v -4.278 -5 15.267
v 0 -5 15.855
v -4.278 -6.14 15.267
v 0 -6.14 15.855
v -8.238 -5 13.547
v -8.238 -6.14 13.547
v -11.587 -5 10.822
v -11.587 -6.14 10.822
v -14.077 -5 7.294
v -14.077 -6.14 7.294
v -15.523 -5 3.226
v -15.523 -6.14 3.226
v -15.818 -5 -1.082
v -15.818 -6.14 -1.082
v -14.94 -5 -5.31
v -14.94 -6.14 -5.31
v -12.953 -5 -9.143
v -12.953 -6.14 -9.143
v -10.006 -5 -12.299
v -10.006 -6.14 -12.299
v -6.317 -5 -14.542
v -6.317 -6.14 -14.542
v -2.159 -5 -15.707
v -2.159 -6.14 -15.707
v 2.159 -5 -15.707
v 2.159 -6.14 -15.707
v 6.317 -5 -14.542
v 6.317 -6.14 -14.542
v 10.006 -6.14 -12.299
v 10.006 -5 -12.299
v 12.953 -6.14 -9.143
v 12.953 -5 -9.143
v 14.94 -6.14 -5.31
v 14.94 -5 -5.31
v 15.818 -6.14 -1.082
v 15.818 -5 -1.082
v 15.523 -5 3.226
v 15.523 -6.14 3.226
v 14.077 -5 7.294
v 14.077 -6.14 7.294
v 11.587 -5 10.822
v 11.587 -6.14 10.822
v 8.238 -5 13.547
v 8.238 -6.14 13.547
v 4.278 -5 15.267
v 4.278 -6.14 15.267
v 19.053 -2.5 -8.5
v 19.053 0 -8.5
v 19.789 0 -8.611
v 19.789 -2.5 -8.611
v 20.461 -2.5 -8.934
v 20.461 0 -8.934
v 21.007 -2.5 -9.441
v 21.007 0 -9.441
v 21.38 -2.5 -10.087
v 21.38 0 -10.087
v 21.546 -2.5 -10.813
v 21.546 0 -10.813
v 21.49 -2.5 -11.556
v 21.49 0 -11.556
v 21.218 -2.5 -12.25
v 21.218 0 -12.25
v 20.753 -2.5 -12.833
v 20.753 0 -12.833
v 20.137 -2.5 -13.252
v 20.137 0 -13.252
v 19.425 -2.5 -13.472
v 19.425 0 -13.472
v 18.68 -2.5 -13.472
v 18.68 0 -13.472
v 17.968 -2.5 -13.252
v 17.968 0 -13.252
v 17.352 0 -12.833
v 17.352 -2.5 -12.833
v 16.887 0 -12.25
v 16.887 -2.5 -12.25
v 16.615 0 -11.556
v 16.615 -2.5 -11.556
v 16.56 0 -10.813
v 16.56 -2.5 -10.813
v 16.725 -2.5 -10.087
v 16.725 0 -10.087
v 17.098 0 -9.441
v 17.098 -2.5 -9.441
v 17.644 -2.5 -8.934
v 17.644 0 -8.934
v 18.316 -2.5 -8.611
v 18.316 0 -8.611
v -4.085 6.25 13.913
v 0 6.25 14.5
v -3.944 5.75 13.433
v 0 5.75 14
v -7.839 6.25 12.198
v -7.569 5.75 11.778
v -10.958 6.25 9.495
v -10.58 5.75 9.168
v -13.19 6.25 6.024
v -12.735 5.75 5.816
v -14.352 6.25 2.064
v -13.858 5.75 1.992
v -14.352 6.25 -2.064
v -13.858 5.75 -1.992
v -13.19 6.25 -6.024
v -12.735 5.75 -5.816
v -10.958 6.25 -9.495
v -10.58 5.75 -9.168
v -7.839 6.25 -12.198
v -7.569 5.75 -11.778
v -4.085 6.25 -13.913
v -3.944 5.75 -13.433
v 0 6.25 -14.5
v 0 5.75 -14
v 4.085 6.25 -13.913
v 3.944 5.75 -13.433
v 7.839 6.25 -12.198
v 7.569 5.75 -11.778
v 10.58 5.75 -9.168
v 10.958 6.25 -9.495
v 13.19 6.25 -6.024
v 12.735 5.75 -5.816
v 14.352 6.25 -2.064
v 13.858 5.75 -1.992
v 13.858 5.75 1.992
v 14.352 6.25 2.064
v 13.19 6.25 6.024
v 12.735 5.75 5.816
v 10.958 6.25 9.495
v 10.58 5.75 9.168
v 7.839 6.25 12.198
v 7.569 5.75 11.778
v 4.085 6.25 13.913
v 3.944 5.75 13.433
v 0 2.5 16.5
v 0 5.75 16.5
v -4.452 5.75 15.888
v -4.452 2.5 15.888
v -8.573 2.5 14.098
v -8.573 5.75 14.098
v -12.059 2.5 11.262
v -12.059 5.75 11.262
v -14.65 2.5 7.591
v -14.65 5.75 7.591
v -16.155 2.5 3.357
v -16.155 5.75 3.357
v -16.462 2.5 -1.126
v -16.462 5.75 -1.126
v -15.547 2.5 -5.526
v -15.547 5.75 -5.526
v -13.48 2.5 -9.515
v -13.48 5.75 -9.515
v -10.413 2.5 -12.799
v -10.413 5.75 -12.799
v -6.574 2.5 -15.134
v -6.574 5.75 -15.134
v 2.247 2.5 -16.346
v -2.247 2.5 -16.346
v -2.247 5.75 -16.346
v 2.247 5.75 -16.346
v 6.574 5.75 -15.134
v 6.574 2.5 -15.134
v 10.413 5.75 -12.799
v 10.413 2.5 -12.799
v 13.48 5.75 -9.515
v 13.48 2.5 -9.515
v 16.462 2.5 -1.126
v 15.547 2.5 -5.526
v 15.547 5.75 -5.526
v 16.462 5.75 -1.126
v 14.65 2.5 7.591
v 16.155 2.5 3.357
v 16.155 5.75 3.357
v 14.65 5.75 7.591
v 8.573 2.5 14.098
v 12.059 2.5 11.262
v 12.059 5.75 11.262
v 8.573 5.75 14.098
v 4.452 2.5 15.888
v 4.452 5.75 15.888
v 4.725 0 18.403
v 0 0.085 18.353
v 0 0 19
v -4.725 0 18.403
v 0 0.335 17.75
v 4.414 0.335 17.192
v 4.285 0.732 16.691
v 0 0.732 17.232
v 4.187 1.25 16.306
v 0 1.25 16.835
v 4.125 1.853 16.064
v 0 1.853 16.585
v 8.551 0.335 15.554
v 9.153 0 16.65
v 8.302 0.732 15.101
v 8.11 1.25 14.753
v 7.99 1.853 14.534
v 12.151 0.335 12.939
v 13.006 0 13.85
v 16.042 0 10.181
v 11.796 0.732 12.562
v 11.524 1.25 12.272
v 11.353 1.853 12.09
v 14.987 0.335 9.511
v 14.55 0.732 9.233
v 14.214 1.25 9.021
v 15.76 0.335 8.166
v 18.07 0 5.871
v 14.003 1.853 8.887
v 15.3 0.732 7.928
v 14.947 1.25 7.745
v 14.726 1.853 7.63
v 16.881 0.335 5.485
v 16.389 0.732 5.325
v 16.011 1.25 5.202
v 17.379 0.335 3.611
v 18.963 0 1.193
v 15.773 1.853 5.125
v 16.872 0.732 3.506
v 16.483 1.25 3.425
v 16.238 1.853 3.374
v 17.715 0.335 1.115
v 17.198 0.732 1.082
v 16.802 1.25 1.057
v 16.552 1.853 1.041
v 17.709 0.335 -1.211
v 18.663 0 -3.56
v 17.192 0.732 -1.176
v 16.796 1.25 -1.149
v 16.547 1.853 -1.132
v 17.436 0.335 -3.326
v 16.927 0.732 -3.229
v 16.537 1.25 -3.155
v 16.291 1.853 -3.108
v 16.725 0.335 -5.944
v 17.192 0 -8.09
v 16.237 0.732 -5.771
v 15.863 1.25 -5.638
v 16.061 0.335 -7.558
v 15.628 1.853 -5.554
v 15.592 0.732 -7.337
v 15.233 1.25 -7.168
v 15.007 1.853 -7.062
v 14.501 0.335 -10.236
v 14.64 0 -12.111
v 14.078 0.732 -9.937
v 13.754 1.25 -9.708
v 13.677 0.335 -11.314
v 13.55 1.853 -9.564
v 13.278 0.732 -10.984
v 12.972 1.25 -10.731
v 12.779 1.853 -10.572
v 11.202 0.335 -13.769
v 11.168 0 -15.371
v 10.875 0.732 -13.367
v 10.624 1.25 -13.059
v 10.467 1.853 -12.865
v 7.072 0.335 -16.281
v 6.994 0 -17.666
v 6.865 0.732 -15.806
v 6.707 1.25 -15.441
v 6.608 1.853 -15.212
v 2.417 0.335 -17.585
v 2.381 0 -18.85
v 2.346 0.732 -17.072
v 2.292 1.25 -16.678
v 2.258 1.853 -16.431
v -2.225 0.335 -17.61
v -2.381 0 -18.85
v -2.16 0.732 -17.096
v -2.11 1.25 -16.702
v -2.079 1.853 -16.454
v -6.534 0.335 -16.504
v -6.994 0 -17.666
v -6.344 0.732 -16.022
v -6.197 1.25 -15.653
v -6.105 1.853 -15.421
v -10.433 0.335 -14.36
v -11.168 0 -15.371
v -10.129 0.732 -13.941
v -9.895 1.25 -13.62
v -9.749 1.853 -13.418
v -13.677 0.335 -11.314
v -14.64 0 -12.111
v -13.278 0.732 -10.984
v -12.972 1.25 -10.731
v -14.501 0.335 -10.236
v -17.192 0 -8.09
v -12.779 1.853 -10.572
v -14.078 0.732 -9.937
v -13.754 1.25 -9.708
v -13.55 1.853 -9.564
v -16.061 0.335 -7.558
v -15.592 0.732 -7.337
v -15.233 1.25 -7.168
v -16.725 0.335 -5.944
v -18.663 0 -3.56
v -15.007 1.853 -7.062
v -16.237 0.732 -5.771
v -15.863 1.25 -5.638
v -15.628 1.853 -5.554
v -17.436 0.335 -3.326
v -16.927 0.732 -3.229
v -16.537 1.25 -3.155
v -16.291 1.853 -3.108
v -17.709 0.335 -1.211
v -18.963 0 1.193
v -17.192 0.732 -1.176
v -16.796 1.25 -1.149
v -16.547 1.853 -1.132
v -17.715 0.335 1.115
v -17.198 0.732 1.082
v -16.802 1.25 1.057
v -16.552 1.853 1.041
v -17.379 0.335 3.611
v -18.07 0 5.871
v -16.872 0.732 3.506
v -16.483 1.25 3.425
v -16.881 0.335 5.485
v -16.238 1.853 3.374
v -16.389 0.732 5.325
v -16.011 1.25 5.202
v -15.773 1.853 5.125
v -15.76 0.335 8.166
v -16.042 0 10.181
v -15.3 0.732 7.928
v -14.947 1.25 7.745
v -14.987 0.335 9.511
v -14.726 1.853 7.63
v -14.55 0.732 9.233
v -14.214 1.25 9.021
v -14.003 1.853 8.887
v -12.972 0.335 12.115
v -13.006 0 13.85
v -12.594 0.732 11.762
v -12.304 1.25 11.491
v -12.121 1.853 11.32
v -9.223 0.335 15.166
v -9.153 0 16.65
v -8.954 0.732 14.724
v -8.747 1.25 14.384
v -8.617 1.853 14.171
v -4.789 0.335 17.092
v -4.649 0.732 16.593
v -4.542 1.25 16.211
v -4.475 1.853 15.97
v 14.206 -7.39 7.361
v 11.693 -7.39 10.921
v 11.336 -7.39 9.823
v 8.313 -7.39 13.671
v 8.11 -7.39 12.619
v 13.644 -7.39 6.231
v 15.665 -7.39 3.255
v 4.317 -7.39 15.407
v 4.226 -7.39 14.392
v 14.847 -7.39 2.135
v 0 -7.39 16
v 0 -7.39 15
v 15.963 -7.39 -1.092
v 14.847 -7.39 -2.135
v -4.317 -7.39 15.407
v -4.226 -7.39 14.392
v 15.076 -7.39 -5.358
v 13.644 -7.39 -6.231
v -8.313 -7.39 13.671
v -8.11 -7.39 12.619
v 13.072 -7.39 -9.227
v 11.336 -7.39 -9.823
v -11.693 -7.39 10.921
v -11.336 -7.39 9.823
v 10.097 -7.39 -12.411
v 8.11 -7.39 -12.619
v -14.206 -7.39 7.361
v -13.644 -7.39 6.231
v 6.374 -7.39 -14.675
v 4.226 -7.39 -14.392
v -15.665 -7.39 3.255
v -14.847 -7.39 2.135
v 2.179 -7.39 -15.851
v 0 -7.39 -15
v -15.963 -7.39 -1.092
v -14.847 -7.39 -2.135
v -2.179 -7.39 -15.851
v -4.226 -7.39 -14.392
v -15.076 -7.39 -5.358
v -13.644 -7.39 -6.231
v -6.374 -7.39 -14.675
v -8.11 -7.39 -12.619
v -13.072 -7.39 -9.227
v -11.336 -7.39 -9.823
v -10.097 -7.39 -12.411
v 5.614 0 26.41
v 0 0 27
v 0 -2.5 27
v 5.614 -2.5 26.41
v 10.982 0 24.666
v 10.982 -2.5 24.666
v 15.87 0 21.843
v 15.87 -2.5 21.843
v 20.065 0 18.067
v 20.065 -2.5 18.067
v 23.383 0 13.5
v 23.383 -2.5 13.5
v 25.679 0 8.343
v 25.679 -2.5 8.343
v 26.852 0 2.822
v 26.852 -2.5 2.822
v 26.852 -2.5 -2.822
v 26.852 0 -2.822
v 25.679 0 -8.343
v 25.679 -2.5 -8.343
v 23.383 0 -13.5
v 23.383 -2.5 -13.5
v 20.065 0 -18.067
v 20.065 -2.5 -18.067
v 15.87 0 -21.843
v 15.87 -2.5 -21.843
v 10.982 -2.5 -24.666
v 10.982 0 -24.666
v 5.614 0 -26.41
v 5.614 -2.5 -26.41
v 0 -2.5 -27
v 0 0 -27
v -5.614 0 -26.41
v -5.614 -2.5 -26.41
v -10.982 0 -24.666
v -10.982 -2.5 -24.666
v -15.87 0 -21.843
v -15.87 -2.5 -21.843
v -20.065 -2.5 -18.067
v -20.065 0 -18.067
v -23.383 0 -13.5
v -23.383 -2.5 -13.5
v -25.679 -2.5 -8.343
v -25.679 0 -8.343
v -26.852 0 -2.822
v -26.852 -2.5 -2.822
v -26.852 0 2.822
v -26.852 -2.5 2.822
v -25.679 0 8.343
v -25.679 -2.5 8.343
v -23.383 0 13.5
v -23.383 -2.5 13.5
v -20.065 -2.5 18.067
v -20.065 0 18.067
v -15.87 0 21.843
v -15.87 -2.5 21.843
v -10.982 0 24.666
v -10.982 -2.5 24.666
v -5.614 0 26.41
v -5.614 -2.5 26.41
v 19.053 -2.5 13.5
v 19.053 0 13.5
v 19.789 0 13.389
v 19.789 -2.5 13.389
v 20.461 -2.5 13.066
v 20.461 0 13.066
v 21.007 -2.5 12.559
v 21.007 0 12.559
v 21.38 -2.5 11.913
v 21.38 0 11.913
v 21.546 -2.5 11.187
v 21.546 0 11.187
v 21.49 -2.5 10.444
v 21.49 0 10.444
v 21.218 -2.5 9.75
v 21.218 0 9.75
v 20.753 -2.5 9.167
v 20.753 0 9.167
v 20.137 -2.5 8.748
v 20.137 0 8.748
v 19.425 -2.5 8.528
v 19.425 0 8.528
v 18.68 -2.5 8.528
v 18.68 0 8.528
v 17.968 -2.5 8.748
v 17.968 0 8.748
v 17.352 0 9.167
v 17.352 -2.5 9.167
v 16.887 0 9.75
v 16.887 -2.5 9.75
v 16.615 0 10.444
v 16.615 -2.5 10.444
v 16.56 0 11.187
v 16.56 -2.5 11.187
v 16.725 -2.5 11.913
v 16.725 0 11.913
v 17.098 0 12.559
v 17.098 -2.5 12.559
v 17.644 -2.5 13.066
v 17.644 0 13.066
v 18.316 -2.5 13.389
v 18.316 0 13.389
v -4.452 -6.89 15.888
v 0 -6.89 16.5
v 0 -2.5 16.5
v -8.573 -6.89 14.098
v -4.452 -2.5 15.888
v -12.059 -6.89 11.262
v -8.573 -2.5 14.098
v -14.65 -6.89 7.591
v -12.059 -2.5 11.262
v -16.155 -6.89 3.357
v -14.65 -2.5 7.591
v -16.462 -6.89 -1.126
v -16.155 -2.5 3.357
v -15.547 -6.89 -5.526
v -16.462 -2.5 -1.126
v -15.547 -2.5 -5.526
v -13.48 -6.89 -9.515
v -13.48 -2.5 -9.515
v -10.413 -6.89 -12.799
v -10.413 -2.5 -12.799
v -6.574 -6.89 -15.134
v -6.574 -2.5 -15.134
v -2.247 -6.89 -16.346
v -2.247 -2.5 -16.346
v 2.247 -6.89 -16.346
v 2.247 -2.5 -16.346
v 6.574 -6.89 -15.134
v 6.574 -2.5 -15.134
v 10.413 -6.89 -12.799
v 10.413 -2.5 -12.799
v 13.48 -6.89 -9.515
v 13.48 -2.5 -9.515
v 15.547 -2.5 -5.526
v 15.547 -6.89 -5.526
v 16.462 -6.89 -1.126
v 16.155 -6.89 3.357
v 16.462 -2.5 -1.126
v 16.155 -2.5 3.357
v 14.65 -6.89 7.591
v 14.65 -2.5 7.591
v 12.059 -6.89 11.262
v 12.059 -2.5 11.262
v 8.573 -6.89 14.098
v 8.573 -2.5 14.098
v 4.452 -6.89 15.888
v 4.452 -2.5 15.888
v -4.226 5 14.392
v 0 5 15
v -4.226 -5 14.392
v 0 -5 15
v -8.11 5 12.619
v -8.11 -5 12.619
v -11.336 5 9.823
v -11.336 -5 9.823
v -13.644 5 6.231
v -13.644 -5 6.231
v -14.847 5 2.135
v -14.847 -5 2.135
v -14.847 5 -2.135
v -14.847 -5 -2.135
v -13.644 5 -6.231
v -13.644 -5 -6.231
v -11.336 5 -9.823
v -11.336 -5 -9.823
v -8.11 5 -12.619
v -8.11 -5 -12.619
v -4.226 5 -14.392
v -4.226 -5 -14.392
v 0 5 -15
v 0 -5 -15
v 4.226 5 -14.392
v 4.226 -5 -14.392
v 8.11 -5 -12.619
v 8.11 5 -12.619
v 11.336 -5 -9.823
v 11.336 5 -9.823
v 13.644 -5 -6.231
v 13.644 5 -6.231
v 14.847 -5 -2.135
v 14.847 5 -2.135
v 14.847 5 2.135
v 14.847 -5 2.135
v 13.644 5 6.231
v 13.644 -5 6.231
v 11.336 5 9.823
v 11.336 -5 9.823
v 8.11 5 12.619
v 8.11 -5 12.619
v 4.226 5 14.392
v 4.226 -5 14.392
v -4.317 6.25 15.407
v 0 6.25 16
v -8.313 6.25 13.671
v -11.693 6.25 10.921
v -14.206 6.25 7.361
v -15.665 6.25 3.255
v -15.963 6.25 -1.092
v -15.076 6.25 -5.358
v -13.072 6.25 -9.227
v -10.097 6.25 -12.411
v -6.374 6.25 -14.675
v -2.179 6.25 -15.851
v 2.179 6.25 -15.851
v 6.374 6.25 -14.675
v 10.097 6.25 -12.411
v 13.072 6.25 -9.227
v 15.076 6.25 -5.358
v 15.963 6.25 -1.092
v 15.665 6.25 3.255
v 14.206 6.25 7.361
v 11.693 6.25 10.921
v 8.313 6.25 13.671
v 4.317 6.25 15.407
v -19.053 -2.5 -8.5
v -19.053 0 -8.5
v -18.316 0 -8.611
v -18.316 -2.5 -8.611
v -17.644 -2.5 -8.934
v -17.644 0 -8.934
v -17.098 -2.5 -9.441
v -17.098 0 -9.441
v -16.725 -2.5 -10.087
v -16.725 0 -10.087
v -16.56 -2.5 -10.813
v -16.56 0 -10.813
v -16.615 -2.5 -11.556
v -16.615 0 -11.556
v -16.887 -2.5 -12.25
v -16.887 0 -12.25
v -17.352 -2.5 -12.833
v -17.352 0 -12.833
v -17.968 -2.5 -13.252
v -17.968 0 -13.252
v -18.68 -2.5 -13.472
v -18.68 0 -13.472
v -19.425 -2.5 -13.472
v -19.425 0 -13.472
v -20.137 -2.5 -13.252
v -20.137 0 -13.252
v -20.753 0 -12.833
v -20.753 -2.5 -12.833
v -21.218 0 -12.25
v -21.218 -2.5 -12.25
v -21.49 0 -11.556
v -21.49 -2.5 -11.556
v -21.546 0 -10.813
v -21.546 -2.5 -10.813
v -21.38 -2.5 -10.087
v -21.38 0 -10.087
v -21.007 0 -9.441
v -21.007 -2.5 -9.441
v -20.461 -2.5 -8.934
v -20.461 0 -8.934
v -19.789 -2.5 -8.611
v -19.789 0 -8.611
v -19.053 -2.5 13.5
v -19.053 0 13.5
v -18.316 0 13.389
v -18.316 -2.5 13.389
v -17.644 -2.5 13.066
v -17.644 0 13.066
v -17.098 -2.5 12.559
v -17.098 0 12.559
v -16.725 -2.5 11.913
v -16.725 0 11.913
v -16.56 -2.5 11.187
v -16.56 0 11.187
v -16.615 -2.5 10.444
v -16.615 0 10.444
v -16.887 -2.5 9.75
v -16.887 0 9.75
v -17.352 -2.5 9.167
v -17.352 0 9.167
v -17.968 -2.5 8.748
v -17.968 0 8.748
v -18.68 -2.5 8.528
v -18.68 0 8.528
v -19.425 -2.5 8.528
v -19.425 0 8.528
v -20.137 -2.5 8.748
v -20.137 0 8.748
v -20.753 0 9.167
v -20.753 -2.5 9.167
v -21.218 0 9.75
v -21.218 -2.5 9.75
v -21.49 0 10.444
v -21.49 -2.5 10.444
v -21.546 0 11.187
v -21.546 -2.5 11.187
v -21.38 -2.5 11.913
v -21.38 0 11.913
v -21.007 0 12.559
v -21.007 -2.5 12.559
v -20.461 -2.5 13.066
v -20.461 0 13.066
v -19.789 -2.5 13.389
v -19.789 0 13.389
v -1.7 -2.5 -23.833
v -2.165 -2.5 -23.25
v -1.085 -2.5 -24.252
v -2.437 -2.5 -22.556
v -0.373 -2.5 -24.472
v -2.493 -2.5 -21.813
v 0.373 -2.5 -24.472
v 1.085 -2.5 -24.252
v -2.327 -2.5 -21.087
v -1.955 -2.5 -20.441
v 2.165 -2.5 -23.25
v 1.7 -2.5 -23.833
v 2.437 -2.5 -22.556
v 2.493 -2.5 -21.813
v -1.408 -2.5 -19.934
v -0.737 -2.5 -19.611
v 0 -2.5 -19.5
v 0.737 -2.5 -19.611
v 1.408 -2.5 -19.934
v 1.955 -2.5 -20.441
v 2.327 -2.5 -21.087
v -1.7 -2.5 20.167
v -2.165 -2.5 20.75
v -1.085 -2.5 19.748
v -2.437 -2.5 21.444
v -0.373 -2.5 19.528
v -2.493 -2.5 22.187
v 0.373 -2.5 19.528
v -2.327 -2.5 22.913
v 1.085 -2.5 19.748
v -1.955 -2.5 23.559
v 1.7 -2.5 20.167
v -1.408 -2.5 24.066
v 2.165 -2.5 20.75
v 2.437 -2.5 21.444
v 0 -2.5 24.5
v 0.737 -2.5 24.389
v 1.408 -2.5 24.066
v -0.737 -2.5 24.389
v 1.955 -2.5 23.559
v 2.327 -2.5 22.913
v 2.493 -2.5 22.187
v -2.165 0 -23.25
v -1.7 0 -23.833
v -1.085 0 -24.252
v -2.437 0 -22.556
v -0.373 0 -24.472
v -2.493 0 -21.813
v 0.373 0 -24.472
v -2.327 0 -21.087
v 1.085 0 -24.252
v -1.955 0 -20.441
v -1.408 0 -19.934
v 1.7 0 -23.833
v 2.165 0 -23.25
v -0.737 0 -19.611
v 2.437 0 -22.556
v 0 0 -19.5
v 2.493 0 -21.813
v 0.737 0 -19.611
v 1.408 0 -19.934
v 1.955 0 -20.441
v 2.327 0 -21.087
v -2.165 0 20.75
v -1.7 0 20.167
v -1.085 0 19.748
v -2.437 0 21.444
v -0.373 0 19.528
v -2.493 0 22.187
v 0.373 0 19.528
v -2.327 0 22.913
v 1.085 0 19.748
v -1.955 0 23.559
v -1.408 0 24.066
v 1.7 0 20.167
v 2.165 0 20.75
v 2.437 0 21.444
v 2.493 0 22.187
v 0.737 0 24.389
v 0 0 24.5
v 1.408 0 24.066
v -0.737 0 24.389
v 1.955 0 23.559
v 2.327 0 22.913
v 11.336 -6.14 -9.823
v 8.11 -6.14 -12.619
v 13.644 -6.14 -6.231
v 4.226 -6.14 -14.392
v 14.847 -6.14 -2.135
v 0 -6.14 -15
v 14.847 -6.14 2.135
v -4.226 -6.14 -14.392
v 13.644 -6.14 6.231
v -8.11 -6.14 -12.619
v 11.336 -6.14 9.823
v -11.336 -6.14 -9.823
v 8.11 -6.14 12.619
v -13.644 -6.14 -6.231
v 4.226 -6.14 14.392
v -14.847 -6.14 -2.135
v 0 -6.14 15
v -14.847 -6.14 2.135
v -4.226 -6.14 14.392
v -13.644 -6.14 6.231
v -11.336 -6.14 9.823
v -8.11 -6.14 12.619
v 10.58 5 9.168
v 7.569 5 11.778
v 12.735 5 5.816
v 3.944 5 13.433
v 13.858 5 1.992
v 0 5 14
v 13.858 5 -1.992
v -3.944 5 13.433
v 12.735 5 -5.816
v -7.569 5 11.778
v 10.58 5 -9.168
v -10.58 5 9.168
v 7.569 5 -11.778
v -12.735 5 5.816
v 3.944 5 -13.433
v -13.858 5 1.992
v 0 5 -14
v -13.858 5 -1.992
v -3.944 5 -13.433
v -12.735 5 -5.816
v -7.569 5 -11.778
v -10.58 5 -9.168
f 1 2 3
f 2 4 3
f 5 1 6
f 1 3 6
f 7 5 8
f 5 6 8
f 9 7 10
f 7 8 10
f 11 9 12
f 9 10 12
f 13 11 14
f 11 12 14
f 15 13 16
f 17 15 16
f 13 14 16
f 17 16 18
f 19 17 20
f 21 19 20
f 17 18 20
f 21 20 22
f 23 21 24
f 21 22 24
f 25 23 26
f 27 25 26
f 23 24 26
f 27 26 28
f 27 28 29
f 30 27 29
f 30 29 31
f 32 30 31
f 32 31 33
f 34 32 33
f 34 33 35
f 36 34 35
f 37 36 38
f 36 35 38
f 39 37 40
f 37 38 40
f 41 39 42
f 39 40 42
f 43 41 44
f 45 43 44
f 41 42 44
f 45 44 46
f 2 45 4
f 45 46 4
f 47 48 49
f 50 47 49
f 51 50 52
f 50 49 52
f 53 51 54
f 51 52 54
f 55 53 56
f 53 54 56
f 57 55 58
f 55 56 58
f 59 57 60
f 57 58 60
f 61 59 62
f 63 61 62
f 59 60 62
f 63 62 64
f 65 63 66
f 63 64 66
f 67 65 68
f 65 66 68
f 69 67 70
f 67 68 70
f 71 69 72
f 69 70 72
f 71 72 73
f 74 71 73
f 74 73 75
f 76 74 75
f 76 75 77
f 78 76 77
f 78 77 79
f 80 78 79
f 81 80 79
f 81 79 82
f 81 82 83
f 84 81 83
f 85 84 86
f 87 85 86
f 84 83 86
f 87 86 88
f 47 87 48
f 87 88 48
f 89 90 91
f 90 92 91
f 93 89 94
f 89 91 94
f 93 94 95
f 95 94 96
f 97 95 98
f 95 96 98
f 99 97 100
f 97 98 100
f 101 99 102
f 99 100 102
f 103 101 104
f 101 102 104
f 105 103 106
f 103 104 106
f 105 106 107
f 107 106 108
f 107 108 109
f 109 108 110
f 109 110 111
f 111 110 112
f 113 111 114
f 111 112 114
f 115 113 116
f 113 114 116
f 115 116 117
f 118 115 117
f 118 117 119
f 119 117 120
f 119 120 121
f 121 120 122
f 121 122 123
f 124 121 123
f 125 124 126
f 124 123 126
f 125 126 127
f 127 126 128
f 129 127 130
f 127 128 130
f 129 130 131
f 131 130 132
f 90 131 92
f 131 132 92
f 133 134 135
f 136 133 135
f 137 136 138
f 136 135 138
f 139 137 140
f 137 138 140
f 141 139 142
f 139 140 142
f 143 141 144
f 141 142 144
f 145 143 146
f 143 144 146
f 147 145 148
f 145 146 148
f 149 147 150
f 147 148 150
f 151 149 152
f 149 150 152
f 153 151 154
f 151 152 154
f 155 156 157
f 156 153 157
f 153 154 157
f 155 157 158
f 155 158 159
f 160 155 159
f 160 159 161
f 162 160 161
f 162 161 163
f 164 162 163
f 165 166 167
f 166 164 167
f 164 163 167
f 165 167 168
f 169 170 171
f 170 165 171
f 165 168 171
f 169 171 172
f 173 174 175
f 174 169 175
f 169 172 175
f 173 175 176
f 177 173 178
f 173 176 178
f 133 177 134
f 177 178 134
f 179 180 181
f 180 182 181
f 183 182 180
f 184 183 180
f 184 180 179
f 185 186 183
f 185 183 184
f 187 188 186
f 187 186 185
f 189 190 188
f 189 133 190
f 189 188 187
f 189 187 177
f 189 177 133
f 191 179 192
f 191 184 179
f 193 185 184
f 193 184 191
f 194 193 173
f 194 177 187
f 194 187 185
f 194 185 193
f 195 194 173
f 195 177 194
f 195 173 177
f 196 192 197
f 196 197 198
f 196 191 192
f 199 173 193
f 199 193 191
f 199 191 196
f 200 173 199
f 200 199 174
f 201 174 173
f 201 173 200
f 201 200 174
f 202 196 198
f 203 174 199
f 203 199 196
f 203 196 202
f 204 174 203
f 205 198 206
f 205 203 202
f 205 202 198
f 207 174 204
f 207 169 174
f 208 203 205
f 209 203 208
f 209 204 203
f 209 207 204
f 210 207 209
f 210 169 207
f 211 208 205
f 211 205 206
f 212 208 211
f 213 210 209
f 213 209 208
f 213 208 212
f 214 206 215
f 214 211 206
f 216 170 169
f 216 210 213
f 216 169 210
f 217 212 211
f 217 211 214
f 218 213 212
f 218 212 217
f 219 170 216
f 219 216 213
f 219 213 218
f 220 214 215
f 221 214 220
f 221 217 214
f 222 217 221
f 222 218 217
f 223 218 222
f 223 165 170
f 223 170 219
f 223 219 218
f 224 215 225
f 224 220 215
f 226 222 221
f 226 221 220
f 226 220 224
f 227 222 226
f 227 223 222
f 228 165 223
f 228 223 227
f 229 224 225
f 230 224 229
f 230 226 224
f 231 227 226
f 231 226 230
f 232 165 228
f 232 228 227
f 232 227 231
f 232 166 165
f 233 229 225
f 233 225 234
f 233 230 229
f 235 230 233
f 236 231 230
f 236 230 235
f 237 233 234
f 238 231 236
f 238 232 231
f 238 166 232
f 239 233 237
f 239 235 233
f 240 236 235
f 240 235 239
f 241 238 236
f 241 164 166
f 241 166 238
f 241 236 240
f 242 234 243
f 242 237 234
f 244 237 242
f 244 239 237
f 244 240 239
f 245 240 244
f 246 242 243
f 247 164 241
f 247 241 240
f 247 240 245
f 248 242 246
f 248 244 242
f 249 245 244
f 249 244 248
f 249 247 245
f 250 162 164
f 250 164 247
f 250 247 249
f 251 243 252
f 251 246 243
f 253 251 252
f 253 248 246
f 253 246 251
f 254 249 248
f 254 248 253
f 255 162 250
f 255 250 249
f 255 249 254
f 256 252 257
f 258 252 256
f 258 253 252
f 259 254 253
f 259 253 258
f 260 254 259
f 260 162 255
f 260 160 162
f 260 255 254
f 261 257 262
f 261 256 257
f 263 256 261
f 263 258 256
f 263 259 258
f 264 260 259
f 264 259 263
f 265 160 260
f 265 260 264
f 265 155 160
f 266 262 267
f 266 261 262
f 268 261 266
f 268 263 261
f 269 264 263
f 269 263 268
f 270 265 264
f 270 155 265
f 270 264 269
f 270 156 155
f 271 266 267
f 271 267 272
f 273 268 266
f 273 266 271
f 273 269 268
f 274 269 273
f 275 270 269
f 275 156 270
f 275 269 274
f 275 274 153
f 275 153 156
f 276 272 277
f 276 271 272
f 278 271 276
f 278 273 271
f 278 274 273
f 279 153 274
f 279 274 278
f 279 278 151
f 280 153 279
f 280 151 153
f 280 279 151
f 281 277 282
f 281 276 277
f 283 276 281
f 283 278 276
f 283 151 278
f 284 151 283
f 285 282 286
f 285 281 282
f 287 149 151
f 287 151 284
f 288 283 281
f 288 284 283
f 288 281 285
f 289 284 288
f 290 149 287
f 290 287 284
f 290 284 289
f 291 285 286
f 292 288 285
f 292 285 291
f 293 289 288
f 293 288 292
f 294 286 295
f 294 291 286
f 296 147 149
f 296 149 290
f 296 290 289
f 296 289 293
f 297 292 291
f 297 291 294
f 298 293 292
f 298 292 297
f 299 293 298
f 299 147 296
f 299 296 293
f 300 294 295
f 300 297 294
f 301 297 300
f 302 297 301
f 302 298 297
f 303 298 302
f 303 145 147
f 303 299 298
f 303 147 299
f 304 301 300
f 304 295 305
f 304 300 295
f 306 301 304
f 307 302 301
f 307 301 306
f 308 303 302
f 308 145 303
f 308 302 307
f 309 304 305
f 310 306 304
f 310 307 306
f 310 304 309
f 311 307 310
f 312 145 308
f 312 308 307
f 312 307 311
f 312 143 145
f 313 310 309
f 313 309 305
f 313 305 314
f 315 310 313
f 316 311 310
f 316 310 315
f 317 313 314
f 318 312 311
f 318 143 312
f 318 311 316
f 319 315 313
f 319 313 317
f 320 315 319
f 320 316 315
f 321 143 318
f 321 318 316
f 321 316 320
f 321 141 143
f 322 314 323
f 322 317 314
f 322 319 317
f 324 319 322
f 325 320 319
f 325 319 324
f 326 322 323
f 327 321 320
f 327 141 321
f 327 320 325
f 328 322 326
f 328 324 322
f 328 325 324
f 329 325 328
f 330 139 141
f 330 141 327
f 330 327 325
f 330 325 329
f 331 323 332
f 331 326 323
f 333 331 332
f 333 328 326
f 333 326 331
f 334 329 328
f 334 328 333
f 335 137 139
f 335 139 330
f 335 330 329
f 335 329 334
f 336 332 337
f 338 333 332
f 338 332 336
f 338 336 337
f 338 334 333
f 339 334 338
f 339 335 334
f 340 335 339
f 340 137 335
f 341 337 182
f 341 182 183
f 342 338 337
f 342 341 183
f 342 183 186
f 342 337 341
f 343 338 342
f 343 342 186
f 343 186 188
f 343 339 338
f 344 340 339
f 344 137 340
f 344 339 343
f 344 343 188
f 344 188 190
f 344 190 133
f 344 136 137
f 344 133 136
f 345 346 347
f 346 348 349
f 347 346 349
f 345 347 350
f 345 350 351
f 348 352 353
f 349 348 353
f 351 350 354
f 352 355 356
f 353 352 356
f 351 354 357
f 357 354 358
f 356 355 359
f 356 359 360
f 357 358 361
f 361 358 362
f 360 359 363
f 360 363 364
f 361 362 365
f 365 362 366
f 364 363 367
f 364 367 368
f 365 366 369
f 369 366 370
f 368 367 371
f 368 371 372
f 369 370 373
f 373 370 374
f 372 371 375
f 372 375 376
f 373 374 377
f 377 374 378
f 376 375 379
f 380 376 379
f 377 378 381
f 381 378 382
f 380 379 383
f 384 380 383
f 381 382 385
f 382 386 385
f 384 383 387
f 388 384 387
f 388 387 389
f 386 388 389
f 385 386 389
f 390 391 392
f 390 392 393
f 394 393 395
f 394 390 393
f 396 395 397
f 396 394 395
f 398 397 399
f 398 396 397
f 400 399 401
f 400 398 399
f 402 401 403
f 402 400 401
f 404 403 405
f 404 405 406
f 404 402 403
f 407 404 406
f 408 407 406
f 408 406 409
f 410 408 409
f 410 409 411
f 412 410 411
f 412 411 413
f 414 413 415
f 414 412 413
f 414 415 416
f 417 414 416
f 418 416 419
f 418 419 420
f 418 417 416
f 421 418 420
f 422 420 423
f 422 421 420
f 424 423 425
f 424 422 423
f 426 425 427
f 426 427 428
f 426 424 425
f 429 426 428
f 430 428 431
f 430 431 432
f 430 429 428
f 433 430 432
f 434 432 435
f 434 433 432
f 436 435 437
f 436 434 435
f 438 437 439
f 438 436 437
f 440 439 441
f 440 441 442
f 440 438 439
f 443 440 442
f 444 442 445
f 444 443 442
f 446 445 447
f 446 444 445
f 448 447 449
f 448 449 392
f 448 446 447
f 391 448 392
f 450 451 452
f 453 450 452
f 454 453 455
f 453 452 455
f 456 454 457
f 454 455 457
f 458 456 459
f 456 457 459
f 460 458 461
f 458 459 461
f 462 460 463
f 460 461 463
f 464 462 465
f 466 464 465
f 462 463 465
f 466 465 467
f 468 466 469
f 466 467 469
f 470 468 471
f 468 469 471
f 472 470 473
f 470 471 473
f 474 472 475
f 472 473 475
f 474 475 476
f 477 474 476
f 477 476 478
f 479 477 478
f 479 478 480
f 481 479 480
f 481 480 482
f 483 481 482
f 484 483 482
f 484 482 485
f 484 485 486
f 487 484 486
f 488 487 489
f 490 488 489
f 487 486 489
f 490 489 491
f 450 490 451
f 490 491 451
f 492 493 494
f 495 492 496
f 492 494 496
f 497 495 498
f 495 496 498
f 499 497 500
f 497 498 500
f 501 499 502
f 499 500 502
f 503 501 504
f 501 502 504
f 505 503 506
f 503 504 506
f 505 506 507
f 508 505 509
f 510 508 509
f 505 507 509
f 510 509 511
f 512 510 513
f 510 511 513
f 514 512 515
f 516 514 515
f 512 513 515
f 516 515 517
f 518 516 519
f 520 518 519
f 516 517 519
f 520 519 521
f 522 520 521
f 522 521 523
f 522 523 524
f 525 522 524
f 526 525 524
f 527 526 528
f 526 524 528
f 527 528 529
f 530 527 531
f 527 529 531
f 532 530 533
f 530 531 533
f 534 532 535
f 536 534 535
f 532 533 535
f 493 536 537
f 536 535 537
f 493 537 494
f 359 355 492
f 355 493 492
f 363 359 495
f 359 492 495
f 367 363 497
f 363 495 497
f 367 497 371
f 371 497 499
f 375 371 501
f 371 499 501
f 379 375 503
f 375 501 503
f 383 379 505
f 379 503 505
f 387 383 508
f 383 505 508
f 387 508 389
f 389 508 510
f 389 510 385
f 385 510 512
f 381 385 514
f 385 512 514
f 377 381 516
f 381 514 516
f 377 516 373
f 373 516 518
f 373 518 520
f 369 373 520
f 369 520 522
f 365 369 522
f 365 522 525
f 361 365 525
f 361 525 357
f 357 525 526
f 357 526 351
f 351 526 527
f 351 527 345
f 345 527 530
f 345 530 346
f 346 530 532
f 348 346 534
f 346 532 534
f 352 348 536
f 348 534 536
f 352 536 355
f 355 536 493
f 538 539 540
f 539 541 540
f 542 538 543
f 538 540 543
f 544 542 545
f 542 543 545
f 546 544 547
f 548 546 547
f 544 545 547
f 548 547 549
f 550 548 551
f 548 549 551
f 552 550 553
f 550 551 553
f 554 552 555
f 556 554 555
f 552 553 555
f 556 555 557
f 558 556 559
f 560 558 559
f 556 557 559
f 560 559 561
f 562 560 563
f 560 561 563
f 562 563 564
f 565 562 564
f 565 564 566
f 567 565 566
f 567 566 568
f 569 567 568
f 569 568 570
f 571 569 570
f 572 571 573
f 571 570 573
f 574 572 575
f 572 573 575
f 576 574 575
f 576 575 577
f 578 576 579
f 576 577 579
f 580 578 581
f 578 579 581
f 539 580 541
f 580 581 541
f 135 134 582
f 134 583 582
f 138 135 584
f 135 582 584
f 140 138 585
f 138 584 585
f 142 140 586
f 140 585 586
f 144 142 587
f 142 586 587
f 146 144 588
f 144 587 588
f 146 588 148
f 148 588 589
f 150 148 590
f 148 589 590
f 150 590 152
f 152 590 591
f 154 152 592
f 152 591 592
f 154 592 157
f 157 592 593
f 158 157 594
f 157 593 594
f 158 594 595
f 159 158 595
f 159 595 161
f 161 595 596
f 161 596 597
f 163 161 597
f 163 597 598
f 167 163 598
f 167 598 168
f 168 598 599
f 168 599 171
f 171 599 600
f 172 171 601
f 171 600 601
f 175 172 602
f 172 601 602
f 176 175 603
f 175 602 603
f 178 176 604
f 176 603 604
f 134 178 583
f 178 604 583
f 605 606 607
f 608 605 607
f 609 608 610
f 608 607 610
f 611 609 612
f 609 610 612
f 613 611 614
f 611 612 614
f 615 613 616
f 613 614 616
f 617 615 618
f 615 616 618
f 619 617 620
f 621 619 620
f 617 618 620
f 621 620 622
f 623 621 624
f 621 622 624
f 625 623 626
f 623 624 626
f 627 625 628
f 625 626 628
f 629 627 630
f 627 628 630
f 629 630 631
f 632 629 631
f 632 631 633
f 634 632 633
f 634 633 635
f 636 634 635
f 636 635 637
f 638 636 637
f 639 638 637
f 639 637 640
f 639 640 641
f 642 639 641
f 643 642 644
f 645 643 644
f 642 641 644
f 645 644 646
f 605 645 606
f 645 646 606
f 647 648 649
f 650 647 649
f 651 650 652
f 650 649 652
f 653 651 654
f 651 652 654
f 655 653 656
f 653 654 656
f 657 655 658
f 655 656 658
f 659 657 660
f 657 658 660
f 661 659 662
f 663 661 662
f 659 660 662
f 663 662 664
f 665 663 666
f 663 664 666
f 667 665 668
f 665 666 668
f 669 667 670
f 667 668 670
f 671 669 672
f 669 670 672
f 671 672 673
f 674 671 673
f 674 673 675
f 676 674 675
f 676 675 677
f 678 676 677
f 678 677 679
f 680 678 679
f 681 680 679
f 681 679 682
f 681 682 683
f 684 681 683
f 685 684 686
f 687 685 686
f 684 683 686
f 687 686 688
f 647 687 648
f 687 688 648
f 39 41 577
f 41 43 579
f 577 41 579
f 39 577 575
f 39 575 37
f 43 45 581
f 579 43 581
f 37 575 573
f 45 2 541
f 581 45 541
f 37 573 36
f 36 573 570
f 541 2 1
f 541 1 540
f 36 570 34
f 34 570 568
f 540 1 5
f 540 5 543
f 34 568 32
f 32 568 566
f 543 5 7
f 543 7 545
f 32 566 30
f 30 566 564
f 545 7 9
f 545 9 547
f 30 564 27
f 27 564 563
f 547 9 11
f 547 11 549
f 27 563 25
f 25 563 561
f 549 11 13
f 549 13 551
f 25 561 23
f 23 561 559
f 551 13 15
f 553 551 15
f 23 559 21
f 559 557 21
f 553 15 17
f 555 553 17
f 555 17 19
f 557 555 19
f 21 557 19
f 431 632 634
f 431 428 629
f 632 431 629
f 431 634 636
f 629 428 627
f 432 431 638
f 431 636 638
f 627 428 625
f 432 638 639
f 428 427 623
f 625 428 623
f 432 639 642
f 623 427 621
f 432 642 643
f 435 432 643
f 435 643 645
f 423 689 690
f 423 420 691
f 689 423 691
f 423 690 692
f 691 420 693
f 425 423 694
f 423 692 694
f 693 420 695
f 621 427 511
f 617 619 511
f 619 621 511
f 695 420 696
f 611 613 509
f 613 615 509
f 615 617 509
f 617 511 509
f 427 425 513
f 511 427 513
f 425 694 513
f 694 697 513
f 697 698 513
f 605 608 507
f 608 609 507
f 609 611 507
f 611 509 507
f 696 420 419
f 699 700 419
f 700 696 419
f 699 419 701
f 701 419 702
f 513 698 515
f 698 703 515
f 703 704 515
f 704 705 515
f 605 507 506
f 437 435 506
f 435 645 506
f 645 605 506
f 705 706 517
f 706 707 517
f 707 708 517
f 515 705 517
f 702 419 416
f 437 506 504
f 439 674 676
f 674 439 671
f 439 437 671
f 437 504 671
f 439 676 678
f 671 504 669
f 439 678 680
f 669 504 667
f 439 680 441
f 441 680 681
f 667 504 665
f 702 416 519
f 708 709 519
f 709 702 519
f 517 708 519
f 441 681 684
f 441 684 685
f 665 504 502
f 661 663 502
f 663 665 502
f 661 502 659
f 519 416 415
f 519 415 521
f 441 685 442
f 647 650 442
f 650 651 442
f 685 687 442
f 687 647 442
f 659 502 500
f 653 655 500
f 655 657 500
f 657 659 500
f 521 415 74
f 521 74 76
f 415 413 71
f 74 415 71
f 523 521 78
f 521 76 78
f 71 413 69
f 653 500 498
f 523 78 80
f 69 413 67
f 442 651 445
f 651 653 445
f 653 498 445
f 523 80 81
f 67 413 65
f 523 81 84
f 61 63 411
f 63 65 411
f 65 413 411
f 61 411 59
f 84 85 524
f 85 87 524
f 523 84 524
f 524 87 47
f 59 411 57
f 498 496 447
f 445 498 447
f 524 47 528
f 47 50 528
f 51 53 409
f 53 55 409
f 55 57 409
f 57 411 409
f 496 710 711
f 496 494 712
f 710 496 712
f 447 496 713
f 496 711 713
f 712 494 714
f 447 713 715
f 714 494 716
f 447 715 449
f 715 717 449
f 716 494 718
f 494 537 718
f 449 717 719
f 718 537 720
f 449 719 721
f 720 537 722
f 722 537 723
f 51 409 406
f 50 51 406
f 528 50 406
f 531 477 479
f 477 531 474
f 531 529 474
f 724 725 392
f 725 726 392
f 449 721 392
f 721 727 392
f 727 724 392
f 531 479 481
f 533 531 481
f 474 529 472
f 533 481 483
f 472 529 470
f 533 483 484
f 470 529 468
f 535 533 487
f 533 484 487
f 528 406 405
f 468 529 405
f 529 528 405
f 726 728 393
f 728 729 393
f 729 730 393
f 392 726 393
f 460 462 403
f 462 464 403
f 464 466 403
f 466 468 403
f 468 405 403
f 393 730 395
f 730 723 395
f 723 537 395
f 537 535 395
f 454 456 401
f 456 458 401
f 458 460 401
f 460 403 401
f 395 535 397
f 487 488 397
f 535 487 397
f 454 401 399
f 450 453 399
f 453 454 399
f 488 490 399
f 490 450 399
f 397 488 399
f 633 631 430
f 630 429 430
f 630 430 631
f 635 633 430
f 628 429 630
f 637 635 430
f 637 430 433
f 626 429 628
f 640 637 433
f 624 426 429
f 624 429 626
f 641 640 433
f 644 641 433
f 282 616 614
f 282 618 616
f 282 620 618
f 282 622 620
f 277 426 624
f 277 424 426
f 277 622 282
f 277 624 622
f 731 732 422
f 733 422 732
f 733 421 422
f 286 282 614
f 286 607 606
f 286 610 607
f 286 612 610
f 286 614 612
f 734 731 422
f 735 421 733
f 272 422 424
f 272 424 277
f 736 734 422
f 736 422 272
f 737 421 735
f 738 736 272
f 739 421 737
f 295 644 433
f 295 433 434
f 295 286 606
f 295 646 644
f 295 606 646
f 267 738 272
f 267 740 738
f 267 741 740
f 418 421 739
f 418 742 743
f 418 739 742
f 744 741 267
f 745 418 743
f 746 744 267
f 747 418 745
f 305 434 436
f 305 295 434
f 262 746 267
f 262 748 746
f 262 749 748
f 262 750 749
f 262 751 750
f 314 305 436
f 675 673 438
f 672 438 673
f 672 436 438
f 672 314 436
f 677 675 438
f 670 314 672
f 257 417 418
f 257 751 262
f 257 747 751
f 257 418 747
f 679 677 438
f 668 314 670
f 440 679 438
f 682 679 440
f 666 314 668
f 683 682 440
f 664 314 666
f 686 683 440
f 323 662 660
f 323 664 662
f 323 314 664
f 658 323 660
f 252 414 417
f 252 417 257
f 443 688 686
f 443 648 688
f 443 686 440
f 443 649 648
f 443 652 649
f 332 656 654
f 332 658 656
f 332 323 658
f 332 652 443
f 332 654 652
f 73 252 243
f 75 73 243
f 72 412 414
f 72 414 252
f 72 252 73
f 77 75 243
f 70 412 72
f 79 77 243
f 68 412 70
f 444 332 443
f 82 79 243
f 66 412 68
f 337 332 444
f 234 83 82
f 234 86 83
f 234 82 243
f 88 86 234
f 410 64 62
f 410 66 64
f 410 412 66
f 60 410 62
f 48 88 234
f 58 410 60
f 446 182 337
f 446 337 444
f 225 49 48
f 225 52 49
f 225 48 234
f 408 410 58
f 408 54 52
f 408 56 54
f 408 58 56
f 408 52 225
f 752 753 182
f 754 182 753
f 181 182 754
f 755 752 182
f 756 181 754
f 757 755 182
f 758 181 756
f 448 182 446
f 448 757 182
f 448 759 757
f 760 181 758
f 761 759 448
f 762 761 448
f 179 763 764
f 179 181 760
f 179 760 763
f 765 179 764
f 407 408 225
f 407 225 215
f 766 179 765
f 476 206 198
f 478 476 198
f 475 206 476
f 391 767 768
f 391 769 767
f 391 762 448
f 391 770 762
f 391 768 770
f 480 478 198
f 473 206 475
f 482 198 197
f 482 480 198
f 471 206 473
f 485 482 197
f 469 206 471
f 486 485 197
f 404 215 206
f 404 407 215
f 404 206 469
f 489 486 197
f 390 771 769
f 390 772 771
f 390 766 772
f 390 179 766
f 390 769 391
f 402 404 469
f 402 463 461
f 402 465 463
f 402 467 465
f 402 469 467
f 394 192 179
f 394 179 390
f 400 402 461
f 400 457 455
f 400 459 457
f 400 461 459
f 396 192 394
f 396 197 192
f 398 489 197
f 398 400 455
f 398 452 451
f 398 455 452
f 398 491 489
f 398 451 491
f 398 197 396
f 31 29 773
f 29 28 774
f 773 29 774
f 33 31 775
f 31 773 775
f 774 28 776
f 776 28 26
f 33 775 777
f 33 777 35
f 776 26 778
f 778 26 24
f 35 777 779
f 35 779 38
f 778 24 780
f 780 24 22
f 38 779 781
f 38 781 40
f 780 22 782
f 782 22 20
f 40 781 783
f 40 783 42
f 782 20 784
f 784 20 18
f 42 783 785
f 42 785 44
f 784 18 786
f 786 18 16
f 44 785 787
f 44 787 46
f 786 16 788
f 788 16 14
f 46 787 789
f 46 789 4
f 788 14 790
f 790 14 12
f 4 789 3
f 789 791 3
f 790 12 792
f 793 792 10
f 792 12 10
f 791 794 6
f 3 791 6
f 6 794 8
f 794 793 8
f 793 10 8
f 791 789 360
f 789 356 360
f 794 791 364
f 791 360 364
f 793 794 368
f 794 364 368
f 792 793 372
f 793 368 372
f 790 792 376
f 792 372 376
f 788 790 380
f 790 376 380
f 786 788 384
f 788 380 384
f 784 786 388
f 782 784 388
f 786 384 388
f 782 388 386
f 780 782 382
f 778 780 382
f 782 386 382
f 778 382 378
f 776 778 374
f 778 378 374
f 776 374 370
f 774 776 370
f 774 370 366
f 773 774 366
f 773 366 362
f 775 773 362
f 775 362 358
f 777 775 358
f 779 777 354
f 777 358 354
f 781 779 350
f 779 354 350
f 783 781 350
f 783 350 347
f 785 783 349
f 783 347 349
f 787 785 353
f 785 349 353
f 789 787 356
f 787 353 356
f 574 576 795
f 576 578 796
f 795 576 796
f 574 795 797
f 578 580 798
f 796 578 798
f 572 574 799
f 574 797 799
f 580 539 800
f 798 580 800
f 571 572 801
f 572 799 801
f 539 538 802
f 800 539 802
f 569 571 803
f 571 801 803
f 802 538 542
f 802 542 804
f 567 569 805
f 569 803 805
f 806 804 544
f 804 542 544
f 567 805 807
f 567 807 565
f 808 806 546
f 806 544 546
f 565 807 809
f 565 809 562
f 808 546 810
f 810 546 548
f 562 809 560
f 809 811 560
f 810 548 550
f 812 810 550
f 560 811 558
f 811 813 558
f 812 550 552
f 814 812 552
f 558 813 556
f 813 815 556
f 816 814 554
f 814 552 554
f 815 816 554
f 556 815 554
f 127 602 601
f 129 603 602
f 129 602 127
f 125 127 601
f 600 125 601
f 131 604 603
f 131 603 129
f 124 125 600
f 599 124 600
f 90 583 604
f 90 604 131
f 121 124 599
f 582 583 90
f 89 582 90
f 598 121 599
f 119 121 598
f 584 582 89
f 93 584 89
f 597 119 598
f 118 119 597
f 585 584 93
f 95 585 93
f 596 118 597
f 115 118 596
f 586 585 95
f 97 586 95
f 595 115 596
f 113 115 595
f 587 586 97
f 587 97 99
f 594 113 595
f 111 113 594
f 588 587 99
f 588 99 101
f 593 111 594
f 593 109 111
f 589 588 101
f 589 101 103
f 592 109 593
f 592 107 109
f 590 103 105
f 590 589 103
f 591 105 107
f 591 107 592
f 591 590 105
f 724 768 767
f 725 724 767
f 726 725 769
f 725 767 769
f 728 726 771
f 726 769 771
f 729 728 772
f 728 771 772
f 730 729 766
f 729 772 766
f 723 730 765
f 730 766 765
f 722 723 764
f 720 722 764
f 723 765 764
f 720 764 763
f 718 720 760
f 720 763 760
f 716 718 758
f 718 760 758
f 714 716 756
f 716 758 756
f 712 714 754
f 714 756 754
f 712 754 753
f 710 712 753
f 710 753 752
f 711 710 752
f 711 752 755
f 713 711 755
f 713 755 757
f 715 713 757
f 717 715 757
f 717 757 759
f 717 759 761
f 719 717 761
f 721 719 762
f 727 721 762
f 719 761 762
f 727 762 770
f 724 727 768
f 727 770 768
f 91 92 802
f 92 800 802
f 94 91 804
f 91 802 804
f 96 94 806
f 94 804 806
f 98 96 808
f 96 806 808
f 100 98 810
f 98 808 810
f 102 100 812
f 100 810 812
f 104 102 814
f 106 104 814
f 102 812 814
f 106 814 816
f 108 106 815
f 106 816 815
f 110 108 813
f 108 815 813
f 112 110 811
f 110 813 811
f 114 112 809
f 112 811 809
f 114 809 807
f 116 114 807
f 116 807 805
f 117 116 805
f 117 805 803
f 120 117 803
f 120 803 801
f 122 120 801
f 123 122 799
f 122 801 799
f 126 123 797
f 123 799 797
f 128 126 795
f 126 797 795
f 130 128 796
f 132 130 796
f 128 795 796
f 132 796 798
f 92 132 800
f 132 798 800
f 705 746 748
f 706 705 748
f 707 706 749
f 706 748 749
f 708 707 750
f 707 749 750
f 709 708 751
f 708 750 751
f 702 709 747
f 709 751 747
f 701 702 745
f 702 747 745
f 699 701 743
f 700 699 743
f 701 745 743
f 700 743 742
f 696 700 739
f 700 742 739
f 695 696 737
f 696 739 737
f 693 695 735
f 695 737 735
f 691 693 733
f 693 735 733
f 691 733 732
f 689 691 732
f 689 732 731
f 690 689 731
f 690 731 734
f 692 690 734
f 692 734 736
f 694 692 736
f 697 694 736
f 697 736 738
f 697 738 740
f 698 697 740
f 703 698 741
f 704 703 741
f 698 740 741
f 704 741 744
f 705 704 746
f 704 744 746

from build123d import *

# Parameters (mm, degrees)
SKETCH1_R           = 27
SKETCH1_R_2         = 2.5
SKETCH1_R_3         = 16.5
BOSS_EXTRUDE1_DEPTH = 2.5
FILLET1_R           = 2.5


with BuildPart() as part:
    # Sketch1 → Boss-Extrude1 (new body)
    with BuildSketch(Plane(origin=(0, 0, 0), x_dir=(1, 0, 0), z_dir=(0, 1, 0))):
        Circle(SKETCH1_R)
        with Locations((0, 22)):
            Circle(SKETCH1_R_2, mode=Mode.SUBTRACT)
        with Locations((19.052558883, 11)):
            Circle(SKETCH1_R_2, mode=Mode.SUBTRACT)
        with Locations((19.052558883, -11)):
            Circle(SKETCH1_R_2, mode=Mode.SUBTRACT)
        with Locations((0, -22)):
            Circle(SKETCH1_R_2, mode=Mode.SUBTRACT)
        with Locations((-19.052558883, -11)):
            Circle(SKETCH1_R_2, mode=Mode.SUBTRACT)
        with Locations((-19.052558883, 11)):
            Circle(SKETCH1_R_2, mode=Mode.SUBTRACT)
        Circle(SKETCH1_R_3, mode=Mode.SUBTRACT)
    extrude(amount=-BOSS_EXTRUDE1_DEPTH)

    # Sketch4 → Revolve1 (revolve)
    with BuildSketch(Plane(origin=(0, 0, 0), x_dir=(0, 0, -1), z_dir=(1, 0, 0))):
        Polygon((-16.5, -6.89), (-16.5, 5.75), (-16, 6.25), (-14.992862102, 6.25), (-14.5, 6.25), (-14, 5.75), (-14, 5), (-15, 5), (-15, -5), (-15.855, -5), (-15.855, -6.14), (-15, -6.14), (-15, -7.39), (-16, -7.39), align=None)
    revolve(axis=Axis((0, 12.74988571, 0), (0, -1, 0)))

    # Fillet1
    fillet1_edges = [part.edges().sort_by_distance(p)[0] for p in [
        (0, 0, -16.5),
    ]]
    fillet(fillet1_edges, radius=FILLET1_R)


solid = part.part
